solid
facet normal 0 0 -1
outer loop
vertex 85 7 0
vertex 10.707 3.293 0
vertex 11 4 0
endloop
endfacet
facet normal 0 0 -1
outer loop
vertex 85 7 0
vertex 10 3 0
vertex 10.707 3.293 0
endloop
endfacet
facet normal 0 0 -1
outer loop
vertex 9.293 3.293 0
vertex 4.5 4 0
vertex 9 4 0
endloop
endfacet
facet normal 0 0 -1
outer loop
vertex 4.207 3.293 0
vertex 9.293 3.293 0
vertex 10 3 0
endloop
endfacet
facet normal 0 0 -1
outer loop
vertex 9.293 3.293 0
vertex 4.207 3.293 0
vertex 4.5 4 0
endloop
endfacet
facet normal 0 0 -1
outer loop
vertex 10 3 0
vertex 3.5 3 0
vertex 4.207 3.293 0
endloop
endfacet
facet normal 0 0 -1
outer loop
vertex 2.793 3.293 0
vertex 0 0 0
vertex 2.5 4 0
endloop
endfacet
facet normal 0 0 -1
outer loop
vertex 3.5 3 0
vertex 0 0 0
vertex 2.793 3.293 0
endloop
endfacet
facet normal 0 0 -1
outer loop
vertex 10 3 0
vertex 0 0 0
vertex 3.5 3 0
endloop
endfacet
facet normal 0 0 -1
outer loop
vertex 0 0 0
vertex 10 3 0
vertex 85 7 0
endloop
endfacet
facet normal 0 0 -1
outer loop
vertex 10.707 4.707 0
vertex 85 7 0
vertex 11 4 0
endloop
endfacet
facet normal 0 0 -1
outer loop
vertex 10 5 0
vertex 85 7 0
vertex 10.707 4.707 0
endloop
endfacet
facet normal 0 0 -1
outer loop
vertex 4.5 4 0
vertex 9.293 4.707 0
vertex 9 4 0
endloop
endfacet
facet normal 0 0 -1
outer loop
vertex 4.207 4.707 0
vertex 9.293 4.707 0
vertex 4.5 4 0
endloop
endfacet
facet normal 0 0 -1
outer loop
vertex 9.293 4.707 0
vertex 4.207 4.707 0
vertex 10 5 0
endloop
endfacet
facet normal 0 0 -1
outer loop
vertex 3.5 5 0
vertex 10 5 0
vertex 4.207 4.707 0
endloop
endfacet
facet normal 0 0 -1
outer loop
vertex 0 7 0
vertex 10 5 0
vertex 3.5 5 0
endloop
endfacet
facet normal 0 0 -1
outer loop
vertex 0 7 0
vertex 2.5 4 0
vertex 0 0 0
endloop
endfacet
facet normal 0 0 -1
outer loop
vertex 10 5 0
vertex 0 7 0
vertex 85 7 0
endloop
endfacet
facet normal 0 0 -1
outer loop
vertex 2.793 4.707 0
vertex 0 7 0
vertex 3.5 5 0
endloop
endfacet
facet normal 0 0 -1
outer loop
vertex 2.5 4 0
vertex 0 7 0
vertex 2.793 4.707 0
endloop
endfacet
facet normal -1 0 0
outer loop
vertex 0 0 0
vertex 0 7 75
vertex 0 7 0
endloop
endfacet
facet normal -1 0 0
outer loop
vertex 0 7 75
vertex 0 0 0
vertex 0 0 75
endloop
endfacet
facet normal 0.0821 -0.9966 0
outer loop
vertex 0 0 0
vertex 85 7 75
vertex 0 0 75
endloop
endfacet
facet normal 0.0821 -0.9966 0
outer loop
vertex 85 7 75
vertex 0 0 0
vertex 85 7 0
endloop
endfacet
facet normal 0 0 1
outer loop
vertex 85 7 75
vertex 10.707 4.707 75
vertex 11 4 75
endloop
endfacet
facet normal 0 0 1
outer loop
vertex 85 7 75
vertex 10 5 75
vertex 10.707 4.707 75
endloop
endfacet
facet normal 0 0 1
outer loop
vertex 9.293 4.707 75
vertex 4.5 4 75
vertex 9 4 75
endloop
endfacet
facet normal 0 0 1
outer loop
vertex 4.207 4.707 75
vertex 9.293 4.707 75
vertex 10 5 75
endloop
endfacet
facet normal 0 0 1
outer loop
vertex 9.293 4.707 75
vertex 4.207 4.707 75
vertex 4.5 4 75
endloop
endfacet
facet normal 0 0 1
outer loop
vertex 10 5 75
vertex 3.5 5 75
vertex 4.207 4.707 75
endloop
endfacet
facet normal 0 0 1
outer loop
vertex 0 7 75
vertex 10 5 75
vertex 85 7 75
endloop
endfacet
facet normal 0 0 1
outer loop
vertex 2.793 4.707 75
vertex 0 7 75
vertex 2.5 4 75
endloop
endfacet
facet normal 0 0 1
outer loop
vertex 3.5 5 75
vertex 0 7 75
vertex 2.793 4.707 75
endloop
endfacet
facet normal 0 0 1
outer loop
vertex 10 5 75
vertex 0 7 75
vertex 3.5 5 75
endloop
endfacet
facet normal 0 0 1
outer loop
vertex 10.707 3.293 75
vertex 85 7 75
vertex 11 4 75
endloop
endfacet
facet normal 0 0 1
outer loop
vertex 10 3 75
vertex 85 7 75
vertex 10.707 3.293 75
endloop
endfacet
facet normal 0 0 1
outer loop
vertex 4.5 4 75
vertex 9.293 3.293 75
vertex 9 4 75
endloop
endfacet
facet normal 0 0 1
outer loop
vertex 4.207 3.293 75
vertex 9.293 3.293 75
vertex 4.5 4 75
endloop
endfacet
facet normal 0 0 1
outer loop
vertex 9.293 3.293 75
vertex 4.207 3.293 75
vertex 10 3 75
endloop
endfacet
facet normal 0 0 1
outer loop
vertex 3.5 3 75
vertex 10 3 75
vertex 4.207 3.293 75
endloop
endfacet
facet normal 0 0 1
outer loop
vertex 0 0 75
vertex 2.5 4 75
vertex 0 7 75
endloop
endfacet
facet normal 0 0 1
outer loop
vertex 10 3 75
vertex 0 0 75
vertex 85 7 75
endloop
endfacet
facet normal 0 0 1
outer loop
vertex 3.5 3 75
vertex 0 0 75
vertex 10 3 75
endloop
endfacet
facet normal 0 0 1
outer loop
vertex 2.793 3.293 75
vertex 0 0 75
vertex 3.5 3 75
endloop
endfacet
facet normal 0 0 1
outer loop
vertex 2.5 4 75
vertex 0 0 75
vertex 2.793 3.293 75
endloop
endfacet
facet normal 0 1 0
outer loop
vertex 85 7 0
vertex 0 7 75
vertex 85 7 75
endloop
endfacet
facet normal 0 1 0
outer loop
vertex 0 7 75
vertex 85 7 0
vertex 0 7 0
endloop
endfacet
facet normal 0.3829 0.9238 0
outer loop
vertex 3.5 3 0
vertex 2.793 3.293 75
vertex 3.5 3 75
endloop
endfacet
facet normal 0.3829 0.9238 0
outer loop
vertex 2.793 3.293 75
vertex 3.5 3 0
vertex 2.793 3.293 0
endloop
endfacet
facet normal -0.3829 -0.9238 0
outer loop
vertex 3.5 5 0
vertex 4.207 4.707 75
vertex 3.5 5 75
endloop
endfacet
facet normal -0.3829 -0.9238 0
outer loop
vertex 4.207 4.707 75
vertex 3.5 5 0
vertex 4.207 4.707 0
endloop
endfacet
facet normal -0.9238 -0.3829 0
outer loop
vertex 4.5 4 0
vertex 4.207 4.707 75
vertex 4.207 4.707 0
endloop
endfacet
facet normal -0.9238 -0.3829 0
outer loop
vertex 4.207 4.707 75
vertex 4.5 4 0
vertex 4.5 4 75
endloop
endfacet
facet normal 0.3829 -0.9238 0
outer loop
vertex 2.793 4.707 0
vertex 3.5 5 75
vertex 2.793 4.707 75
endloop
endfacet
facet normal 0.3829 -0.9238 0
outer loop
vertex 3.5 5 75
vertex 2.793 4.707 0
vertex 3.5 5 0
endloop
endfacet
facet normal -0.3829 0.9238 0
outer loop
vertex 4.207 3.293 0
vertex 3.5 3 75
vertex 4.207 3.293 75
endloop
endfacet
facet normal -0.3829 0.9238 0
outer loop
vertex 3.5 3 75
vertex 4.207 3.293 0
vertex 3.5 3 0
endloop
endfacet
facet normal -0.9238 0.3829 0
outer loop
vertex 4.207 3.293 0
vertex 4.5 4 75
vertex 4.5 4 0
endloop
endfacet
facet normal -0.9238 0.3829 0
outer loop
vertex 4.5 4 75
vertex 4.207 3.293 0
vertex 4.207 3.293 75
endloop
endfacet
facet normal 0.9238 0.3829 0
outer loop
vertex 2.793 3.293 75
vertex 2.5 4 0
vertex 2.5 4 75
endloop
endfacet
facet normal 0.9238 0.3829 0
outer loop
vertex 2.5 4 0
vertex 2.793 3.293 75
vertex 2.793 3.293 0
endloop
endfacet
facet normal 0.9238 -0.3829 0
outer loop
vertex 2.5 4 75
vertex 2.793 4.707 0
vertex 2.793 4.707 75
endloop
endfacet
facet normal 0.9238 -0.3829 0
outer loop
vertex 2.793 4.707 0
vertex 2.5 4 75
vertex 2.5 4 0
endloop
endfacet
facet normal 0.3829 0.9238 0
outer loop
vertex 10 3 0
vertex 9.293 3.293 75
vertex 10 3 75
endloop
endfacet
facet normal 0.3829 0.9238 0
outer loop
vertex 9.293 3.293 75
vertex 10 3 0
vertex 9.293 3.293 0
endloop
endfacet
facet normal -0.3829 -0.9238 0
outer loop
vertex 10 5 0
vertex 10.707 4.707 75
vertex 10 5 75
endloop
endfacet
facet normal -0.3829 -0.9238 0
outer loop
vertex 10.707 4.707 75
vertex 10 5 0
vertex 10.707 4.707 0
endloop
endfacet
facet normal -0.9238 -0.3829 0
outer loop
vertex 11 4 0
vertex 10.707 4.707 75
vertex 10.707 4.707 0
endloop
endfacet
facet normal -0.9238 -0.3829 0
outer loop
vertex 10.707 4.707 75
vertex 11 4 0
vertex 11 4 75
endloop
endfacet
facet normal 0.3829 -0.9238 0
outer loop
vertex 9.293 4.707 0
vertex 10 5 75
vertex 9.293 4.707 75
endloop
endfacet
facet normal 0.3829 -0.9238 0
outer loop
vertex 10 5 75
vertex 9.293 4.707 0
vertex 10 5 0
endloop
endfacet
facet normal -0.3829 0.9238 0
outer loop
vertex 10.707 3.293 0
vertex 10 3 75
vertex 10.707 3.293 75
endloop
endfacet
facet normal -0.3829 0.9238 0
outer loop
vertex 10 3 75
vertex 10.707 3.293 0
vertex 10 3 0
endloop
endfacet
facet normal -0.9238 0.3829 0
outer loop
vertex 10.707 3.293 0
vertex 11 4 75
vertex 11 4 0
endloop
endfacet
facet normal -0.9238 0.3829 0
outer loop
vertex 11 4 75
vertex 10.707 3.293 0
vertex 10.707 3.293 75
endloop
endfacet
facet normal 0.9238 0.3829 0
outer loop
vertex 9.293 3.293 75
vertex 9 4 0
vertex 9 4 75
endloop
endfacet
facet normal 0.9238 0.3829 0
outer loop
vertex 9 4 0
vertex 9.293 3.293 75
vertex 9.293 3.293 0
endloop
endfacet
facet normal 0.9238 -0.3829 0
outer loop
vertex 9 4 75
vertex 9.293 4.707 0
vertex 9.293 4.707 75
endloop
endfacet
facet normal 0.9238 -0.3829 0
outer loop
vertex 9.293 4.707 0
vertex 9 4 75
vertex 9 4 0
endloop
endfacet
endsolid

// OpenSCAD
$fn = 8;

difference() {
  linear_extrude(75)
    polygon([[0,0],[0,7],[85,7]]);

  translate([3.5,4,0])
    cylinder(75,r=1);

  translate([10,4,0])
    cylinder(75,r=1);
}
